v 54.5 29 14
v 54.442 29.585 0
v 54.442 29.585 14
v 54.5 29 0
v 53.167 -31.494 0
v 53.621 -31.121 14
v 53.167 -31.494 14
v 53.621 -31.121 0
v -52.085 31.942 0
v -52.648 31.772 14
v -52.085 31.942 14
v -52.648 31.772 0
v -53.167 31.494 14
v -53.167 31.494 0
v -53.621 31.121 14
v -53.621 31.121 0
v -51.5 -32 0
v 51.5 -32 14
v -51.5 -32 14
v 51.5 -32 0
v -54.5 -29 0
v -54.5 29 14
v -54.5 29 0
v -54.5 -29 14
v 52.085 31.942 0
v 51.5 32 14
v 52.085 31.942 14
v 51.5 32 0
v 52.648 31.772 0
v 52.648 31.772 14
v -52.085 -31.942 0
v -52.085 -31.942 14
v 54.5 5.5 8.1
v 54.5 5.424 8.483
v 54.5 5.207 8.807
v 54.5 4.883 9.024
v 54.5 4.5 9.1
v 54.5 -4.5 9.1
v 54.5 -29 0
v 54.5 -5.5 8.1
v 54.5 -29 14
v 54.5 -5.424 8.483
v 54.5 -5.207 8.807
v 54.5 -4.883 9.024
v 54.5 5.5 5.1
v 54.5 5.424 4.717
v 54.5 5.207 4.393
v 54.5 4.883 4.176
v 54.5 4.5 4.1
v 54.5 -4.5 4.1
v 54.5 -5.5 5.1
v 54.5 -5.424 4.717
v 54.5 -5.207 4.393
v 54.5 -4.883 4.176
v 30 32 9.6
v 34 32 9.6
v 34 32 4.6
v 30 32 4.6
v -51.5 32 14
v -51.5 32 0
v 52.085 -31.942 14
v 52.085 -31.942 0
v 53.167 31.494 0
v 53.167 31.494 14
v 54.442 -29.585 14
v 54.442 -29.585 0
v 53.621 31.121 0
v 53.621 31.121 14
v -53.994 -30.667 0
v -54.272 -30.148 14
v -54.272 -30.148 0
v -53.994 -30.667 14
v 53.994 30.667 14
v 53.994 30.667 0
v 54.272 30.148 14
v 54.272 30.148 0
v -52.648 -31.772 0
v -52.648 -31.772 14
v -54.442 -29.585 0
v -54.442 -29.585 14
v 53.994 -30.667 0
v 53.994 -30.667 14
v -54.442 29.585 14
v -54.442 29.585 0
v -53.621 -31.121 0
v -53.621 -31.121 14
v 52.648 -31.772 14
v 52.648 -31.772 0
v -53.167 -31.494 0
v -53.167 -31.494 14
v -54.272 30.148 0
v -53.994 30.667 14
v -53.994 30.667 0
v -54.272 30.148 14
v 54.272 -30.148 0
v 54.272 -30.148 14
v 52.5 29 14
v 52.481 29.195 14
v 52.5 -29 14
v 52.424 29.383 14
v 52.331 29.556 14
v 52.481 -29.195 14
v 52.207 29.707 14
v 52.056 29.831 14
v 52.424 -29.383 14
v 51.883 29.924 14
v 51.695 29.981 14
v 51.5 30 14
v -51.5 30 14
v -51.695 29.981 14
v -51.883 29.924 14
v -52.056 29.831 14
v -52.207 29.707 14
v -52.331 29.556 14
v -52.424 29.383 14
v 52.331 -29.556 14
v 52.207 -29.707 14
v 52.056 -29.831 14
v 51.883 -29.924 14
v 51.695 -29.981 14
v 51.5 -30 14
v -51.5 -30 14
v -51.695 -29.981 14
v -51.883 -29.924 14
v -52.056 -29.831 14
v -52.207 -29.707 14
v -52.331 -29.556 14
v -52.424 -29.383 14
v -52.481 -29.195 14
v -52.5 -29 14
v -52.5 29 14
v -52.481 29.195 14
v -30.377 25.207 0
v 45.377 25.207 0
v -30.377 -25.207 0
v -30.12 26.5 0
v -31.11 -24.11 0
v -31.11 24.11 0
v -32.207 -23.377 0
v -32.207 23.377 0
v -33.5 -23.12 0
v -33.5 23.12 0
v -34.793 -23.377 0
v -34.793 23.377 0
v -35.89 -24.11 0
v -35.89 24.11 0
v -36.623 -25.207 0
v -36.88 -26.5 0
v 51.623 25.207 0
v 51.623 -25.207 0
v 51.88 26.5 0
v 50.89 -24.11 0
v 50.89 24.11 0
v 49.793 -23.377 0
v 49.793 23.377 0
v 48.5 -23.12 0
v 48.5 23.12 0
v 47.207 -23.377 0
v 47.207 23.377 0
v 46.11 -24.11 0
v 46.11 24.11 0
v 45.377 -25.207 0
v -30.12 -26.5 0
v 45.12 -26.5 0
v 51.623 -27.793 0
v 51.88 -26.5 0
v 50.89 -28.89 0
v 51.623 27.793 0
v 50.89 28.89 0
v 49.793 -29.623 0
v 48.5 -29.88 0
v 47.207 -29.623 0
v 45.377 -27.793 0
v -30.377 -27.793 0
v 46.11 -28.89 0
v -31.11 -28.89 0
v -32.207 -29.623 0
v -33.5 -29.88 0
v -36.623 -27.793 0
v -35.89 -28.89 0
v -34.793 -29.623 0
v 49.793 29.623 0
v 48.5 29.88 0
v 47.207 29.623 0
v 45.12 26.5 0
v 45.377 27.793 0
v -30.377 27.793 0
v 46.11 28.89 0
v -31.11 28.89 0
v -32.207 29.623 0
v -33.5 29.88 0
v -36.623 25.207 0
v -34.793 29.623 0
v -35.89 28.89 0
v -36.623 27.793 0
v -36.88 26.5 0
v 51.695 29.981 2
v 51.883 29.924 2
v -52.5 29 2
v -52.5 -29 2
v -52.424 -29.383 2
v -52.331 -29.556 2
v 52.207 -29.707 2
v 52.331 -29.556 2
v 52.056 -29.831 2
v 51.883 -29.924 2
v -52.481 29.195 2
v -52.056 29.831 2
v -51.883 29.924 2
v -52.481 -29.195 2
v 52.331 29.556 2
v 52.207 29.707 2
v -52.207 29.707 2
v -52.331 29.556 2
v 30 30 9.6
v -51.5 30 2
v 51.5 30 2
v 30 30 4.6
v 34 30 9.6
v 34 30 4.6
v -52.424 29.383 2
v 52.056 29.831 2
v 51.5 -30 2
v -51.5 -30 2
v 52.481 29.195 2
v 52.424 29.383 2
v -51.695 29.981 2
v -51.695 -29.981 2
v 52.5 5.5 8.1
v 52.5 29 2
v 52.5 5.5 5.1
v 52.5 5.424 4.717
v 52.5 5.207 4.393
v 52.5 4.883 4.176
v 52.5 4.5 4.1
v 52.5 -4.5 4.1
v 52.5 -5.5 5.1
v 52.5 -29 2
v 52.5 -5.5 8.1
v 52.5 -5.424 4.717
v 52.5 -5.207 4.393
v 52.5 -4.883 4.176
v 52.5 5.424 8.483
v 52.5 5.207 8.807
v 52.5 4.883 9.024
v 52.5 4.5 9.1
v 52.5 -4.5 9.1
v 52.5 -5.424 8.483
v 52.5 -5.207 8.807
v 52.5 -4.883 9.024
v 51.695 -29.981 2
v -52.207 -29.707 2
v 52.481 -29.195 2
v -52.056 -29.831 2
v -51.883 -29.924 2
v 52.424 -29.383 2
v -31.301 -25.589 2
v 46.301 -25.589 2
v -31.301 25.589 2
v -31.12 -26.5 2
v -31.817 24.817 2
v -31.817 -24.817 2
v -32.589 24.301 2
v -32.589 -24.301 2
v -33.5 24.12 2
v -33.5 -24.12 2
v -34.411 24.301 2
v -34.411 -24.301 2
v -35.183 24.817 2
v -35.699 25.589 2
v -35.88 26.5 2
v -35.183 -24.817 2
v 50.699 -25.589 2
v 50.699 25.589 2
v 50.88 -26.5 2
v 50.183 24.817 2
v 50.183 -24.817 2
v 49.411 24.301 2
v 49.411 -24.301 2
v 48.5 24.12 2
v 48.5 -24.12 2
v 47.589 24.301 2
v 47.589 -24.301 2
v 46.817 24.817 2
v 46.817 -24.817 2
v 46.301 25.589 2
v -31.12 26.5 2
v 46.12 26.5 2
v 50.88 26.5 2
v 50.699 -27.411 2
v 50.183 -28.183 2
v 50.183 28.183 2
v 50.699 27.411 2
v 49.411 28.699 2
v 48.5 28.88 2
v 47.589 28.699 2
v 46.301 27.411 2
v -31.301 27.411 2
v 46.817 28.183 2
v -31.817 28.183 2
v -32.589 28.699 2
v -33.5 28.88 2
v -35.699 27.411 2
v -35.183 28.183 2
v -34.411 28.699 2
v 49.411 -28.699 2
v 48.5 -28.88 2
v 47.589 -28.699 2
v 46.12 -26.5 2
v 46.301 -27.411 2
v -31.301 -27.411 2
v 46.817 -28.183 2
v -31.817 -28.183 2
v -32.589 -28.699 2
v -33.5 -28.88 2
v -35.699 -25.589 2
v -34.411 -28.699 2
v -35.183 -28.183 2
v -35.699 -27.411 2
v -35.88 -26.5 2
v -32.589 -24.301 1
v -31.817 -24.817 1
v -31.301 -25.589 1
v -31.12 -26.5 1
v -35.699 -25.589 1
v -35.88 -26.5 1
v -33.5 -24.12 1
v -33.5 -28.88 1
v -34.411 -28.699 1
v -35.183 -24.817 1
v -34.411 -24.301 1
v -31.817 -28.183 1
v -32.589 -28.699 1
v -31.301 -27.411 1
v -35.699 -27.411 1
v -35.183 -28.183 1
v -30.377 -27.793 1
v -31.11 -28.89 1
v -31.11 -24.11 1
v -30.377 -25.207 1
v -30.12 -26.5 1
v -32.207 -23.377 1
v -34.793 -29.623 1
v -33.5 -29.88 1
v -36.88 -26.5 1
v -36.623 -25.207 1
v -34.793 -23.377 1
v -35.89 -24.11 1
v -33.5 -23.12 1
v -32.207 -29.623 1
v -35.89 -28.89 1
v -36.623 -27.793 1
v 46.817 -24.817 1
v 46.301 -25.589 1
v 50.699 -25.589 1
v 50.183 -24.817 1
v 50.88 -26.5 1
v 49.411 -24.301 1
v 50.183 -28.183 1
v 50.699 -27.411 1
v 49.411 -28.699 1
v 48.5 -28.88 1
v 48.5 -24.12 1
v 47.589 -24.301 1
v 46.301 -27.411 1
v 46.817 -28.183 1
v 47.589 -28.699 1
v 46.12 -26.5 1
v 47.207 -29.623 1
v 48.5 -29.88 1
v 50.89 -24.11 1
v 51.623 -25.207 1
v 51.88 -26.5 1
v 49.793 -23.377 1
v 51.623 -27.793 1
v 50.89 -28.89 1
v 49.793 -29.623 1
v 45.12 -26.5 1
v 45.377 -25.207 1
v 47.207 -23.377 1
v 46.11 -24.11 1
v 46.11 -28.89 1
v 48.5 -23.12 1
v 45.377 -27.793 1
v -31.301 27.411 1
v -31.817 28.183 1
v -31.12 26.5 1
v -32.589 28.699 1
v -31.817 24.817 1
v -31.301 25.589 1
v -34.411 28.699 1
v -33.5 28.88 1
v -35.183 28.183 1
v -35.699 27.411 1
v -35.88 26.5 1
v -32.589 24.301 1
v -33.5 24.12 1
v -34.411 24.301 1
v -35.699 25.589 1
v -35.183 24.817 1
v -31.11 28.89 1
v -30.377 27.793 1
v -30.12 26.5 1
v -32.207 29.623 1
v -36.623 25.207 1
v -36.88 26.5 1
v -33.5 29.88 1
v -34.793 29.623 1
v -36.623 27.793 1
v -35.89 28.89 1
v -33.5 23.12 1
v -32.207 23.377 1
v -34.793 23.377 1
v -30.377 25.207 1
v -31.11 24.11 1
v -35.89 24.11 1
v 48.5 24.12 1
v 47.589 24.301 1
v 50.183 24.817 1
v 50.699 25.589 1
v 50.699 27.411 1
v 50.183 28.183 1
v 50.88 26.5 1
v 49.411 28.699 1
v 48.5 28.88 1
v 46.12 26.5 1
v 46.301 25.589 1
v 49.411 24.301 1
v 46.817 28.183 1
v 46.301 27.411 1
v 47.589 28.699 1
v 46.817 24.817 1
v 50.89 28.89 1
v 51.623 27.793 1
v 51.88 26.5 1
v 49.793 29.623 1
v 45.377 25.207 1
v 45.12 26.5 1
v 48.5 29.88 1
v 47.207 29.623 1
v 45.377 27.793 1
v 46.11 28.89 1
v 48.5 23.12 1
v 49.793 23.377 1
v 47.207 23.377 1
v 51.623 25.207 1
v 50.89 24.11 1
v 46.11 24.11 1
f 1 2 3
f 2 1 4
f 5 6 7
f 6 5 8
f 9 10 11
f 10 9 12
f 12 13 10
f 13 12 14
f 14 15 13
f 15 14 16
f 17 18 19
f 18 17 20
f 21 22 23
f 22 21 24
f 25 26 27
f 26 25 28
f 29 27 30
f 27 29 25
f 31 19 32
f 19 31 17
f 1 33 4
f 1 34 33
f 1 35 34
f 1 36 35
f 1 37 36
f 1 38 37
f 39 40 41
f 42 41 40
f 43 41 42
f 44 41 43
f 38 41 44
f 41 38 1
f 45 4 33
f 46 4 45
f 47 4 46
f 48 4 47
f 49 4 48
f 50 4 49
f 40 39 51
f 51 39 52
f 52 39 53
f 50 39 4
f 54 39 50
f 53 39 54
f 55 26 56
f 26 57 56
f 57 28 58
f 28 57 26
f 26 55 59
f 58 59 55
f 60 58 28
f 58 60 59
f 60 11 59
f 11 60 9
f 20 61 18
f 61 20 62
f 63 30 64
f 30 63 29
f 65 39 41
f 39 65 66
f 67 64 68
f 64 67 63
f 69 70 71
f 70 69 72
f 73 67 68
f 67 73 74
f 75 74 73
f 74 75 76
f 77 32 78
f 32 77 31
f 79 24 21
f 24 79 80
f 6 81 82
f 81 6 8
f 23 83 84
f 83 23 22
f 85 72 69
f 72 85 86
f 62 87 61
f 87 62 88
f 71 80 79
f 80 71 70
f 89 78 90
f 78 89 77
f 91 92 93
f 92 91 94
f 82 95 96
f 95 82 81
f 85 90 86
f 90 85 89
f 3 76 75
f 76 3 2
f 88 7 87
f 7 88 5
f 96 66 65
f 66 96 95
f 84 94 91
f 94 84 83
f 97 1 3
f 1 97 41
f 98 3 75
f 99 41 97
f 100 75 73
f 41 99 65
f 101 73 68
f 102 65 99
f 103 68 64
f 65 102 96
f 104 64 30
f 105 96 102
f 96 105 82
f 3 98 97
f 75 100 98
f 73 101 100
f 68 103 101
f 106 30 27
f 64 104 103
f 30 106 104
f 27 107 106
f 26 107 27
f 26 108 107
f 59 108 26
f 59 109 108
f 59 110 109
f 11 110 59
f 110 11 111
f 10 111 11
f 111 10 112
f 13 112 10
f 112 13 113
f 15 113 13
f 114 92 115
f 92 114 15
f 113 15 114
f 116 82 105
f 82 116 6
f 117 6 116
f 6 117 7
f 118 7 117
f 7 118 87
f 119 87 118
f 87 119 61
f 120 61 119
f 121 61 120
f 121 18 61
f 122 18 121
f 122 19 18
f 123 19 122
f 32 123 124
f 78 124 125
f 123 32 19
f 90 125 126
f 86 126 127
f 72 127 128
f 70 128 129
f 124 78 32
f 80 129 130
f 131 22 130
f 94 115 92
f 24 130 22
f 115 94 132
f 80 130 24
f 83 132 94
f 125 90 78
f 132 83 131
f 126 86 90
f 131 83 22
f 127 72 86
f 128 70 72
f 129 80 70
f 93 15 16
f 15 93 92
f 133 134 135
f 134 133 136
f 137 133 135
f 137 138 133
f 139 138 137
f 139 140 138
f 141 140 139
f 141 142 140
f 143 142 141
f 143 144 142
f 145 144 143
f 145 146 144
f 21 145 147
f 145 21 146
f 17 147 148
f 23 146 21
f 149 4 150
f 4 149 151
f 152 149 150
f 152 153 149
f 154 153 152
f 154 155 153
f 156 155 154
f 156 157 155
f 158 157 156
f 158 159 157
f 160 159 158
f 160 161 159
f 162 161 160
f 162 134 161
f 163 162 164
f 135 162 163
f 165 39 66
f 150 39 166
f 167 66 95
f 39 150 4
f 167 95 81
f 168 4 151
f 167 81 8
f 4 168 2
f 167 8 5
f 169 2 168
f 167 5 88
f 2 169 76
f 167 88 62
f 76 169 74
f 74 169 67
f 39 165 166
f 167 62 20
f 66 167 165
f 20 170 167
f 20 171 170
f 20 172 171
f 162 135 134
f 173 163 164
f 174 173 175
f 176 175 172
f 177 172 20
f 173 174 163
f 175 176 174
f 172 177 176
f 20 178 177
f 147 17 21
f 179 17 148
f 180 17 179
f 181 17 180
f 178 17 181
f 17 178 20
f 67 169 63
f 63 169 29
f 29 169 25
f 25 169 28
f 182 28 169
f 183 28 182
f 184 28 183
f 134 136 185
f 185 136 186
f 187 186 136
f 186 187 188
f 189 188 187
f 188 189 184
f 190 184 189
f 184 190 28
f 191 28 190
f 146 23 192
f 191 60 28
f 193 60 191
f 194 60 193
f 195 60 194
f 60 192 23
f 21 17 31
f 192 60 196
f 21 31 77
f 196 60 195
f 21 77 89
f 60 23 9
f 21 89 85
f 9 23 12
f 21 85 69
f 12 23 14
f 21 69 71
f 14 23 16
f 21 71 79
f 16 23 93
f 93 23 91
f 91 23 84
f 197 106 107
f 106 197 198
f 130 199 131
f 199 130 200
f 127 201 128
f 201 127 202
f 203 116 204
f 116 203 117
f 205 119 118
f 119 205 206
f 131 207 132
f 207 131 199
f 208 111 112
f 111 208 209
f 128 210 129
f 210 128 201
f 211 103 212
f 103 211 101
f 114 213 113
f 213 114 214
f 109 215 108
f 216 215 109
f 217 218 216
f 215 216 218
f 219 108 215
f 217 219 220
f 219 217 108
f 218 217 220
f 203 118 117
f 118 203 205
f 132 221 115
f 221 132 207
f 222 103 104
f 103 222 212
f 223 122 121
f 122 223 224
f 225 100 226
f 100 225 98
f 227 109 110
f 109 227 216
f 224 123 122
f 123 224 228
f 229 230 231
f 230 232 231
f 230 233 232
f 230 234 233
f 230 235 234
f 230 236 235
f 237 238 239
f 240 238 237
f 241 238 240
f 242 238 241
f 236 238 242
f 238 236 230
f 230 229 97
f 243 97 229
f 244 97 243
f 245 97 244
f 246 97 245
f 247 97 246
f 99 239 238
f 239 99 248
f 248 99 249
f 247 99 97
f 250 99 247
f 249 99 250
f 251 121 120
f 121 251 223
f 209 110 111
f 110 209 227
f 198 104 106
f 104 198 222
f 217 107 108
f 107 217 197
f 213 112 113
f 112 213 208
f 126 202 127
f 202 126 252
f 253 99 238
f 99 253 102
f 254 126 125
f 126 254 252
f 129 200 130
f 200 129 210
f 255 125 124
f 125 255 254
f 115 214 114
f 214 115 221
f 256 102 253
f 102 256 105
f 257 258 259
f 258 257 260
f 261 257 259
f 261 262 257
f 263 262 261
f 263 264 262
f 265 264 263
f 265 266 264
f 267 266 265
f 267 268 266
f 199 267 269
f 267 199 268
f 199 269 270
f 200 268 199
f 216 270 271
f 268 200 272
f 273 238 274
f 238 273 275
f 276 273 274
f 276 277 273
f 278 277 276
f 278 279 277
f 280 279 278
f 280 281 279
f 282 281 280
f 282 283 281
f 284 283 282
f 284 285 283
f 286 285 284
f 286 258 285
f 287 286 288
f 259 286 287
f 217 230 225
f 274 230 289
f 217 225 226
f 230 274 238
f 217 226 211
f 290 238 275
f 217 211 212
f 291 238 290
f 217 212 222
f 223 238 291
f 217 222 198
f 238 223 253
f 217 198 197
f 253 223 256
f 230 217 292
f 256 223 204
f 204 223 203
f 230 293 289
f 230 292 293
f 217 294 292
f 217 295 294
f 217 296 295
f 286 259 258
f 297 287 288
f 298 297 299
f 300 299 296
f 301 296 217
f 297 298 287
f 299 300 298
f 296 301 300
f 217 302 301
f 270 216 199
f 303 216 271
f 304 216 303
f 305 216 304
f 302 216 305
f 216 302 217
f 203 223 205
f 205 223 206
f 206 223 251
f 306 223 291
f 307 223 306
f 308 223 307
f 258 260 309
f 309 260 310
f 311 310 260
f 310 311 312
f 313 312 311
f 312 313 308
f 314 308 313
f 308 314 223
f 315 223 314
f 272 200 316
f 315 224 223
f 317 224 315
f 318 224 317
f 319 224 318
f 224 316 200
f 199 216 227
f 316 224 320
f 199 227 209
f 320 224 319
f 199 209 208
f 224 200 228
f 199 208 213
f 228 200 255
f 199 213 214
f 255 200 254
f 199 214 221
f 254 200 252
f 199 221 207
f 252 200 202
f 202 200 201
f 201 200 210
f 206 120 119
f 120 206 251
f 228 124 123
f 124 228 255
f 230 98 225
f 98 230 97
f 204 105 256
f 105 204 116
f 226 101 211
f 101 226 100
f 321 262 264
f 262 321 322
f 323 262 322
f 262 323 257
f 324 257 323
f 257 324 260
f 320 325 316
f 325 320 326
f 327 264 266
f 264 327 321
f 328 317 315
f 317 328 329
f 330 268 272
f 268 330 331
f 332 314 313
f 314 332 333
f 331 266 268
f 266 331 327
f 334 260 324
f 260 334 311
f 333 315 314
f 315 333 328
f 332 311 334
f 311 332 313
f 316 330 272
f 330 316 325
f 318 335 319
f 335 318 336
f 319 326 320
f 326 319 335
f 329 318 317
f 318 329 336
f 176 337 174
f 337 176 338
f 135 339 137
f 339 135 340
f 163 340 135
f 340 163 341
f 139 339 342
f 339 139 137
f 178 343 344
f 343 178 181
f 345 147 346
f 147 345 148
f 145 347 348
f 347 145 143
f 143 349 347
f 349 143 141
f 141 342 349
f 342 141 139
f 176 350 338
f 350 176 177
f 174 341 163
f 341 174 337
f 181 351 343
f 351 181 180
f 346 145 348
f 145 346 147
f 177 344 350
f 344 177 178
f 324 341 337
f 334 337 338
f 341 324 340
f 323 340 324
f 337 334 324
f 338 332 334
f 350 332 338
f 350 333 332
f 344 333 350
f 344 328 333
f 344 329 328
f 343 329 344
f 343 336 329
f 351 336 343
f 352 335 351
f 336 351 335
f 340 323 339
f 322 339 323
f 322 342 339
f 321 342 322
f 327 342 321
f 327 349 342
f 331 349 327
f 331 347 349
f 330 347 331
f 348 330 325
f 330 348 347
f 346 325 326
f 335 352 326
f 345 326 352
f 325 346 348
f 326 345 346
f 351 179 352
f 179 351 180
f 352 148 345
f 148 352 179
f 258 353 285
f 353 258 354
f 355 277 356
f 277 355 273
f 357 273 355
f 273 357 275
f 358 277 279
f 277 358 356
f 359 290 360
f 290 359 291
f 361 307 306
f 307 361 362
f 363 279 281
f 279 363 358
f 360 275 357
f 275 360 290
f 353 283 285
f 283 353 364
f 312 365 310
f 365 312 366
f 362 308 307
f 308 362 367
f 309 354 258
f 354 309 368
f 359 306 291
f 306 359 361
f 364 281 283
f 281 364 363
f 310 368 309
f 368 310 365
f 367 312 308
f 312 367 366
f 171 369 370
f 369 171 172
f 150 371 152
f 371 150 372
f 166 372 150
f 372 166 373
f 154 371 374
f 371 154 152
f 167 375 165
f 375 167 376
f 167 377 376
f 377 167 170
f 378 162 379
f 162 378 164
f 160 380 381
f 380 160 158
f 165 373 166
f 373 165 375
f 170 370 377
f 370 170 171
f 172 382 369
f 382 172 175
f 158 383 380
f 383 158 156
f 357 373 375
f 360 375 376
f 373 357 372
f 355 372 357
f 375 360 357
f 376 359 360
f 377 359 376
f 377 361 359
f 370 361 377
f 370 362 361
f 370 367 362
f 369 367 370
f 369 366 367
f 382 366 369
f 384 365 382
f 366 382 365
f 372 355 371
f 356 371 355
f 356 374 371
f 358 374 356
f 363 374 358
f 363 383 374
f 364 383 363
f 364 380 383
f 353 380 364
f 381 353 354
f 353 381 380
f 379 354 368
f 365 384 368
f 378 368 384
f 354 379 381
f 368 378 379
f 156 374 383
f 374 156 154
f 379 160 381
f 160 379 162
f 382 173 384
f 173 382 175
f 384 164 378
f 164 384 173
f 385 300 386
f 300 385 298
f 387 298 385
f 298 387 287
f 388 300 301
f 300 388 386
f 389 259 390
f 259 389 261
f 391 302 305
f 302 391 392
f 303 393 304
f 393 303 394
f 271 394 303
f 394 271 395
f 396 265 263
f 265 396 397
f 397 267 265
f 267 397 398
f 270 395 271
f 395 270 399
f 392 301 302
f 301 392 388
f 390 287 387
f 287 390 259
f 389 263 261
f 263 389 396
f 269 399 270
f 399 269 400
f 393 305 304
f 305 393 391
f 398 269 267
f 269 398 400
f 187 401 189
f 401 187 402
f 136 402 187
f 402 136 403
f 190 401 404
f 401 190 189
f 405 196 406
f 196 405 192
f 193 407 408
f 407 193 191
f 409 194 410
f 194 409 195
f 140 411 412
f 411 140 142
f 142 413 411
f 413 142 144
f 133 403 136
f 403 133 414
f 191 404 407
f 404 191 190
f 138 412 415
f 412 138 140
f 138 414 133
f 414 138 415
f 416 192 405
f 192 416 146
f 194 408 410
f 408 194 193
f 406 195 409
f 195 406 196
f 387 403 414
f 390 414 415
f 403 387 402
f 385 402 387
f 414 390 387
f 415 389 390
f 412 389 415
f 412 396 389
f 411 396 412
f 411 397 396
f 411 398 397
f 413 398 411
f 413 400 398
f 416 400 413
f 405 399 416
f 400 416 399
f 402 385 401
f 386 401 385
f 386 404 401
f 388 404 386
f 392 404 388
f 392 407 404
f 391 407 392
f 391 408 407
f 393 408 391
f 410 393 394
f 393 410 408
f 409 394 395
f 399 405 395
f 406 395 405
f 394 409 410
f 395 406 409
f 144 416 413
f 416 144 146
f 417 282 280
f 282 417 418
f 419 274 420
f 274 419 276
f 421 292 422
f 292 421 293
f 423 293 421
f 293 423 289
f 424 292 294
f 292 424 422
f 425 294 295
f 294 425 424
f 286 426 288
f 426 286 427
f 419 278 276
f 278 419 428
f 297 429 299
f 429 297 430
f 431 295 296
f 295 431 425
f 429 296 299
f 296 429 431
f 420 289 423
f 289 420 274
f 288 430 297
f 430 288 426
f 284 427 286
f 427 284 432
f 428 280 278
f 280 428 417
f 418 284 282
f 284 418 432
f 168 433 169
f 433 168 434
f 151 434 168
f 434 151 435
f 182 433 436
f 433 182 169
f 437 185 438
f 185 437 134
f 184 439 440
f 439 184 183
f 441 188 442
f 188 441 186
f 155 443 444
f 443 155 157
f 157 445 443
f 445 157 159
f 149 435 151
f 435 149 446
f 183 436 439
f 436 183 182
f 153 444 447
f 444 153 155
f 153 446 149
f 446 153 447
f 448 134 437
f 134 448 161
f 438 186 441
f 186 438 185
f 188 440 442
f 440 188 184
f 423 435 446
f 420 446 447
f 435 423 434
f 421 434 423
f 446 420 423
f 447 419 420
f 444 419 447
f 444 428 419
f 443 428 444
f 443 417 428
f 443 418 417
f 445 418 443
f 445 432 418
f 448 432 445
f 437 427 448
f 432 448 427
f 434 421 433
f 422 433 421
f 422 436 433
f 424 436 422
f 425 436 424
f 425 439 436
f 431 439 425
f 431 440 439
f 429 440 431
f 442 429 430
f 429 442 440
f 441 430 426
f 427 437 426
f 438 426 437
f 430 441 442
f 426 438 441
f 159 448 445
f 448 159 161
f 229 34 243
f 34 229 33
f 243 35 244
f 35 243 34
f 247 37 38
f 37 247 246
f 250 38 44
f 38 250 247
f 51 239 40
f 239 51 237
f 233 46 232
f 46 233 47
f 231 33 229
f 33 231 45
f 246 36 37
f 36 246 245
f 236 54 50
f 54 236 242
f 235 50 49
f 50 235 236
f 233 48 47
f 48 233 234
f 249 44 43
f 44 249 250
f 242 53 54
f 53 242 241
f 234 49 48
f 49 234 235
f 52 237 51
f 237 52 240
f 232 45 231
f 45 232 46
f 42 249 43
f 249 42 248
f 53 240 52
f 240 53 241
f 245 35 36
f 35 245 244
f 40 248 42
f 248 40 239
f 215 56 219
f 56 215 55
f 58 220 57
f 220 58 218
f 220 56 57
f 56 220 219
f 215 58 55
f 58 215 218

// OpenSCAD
// MacroPad RP2040 Case (Bottom and Sides)
// Companion to macropad_top_cover.scad
// Parametric design for Adafruit MacroPad RP2040 keyboard controller
// Author: Generated for CircuitPython EVM Controller project
// License: MIT

// The bottom case along with the filler layer and cover OpenSCAD models provivided
// wraps the Adafruit MacroPad RP2040 in a tightfitting case. The case has a USB port
// the reset button opening, as well as 4 mounting holes to fasten the PCD to the case.

// =============================================================================
// PARAMETERS
// =============================================================================

// Adafruit Macropad RP2040 PCB parameters
pcb_length = 105;          // RP2040 PCB length (mm)
pcb_width = 60;            // RP2040 PCB width (mm)
pcb_thickness = 1.6;       // Standard PCB thickness (mm)
pcb_clearance = 1;         // Space around PCB (mm)
pcb_height_clearance = 8;  // Space above PCB for components (mm)

// Overall case dimensions (should match top cover)
bottom_thickness = 2;      // Thickness of bottom plate (mm)
wall_thickness = 2;        // Thickness of side walls (mm)
corner_radius = 3;         // Rounded corner radius (mm)
inner_corner_radius = 1;   // Rounded inner corner radius

case_length = pcb_length + (wall_thickness * 2);   // Total length of case (mm)
case_width = pcb_width +  + (wall_thickness * 2);  // Total width of case (mm)
case_height = 14;          // Height of case walls (mm)

// Top cover integration
top_cover_thickness = 3;   // Thickness of top cover (for fit calculation)
top_cover_lip = 1;         // How much top cover overlaps case walls (mm)

// USB port cutout
usb_width = 11;             // Width of USB-C port (mm)
usb_height = 5;            // ** Was 4 - Height of USB-C port (mm)
usb_offset_from_edge = 3;  // Distance from PCB edge to USB center (mm)
usb_position_y = 0;        // Y position along case width (0 = center)
usb_corner_radius = 1;     // Rounded corners for USB hole

// PCB mounting holes keep 2mm for wall in mind
mount_hole_diameter = 4.56;   // Diameter for M3 screws (mm)
mount_hole_positions = [   // [X, Y] positions relative to PCB center
    [-pcb_length/2 + 19, -26.5],   // Bottom left
    [pcb_length/2 - 4, -26.5],   // Bottom right  
    [-pcb_length/2 + 19, 26.5],    // Top left
    [pcb_length/2 - 4, 26.5]     // Top right
];

// Standoffs for PCB mounting
standoff_height = 6;         // Height of PCB standoffs (mm)
standoff_diameter = 5.2;     // Diameter of standoff base (mm)
standoff_hole_diameter = 2.5; // Hole diameter in standoff for screw (mm)

// 3D printing parameters
clearance = 0.2;           // General clearance (mm)
layer_height = 0.2;        // Your 3D printer layer height (mm)

// Catching indent for Cover support lip
cover_lip_indent = [10, 2.5, 2];


// =============================================================================
// MAIN OBJECT
// =============================================================================

difference() {
    union() {
        // Main case body
        case_body();

        // PCB mounting standoffs
        pcb_standoffs();
    }        

    // Remove internal cavity
    internal_cavity();

    // Remove USB port hole
    usb_port_hole();
    
    // Remove Reset port hole
    reset_port_hole();

    // Remove PCB mounting holes
    pcb_mounting_holes();
}

// Optional: Show PCB position for reference (comment out for final print)
// %pcb_reference();

// =============================================================================
// MODULES (Functions)
// =============================================================================

// Create the main case body with walls
module case_body() {
    // Bottom plate
    hull() {
        // Four corner cylinders for rounded rectangle base
        translate([-(case_length/2 - corner_radius), -(case_width/2 - corner_radius), 0])
            cylinder(h = bottom_thickness, r = corner_radius, $fn = 32);
        
        translate([+(case_length/2 - corner_radius), -(case_width/2 - corner_radius), 0])
            cylinder(h = bottom_thickness, r = corner_radius, $fn = 32);
        
        translate([+(case_length/2 - corner_radius), +(case_width/2 - corner_radius), 0])
            cylinder(h = bottom_thickness, r = corner_radius, $fn = 32);
        
        translate([-(case_length/2 - corner_radius), +(case_width/2 - corner_radius), 0])
            cylinder(h = bottom_thickness, r = corner_radius, $fn = 32);
    }
    
    // Side walls
    difference() {
        // Outer wall
        hull() {
            translate([-(case_length/2 - corner_radius), -(case_width/2 - corner_radius), 0])
                cylinder(h = case_height, r = corner_radius, $fn = 32);
            
            translate([+(case_length/2 - corner_radius), -(case_width/2 - corner_radius), 0])
                cylinder(h = case_height, r = corner_radius, $fn = 32);
            
            translate([+(case_length/2 - corner_radius), +(case_width/2 - corner_radius), 0])
                cylinder(h = case_height, r = corner_radius, $fn = 32);
            
            translate([-(case_length/2 - corner_radius), +(case_width/2 - corner_radius), 0])
                cylinder(h = case_height, r = corner_radius, $fn = 32);
        }
        
        // Inner cavity (removed in main difference)
        translate([0, 0, bottom_thickness])
            hull() {
                inner_radius = corner_radius - wall_thickness;
                inner_length = case_length - 2 * wall_thickness;
                inner_width = case_width - 2 * wall_thickness;
                
                translate([-(inner_length/2 - inner_radius), -(inner_width/2 - inner_radius), 0])
                    cylinder(h = case_height, r = inner_radius, $fn = 32);
                
                translate([+(inner_length/2 - inner_radius), -(inner_width/2 - inner_radius), 0])
                    cylinder(h = case_height, r = inner_radius, $fn = 32);
                
                translate([+(inner_length/2 - inner_radius), +(inner_width/2 - inner_radius), 0])
                    cylinder(h = case_height, r = inner_radius, $fn = 32);
                
                translate([-(inner_length/2 - inner_radius), +(inner_width/2 - inner_radius), 0])
                    cylinder(h = case_height, r = inner_radius, $fn = 32);
            }
    }
    
    // Top cover lip/ledge
    translate([0, 0, case_height - top_cover_thickness]) {
        difference() {
            // Outer ledge
            hull() {
                translate([-(case_length/2 - corner_radius), -(case_width/2 - corner_radius), 0])
                    cylinder(h = top_cover_thickness, r = corner_radius, $fn = 32);
                
                translate([+(case_length/2 - corner_radius), -(case_width/2 - corner_radius), 0])
                    cylinder(h = top_cover_thickness, r = corner_radius, $fn = 32);
                
                translate([+(case_length/2 - corner_radius), +(case_width/2 - corner_radius), 0])
                    cylinder(h = top_cover_thickness, r = corner_radius, $fn = 32);
                
                translate([-(case_length/2 - corner_radius), +(case_width/2 - corner_radius), 0])
                    cylinder(h = top_cover_thickness, r = corner_radius, $fn = 32);
            }
            
            // Inner cutout for top cover
            hull() {
                ledge_radius = corner_radius - top_cover_lip;
                ledge_length = case_length - 2 * top_cover_lip;
                ledge_width = case_width - 2 * top_cover_lip;
                
                translate([-(ledge_length/2 - ledge_radius), -(ledge_width/2 - ledge_radius), -0.5])
                    cylinder(h = top_cover_thickness + 1, r = ledge_radius, $fn = 32);
                
                translate([+(ledge_length/2 - ledge_radius), -(ledge_width/2 - ledge_radius), -0.5])
                    cylinder(h = top_cover_thickness + 1, r = ledge_radius, $fn = 32);
                
                translate([+(ledge_length/2 - ledge_radius), +(ledge_width/2 - ledge_radius), -0.5])
                    cylinder(h = top_cover_thickness + 1, r = ledge_radius, $fn = 32);
                
                translate([-(ledge_length/2 - ledge_radius), +(ledge_width/2 - ledge_radius), -0.5])
                    cylinder(h = top_cover_thickness + 1, r = ledge_radius, $fn = 32);
            }
        }
    }
}

// Create internal cavity (removed from main body)
module internal_cavity() {
    translate([0, 0, bottom_thickness]) {
        inner_radius = inner_corner_radius;
        inner_length = case_length - 2 * wall_thickness;
        inner_width = case_width - 2 * wall_thickness;
        
        hull() {
            translate([-(inner_length/2 - inner_radius), -(inner_width/2 - inner_radius), 0])
                cylinder(h = case_height, r = inner_radius, $fn = 32);
            
            translate([+(inner_length/2 - inner_radius), -(inner_width/2 - inner_radius), 0])
                cylinder(h = case_height, r = inner_radius, $fn = 32);
            
            translate([+(inner_length/2 - inner_radius), +(inner_width/2 - inner_radius), 0])
                cylinder(h = case_height, r = inner_radius, $fn = 32);
            
            translate([-(inner_length/2 - inner_radius), +(inner_width/2 - inner_radius), 0])
                cylinder(h = case_height, r = inner_radius, $fn = 32);
        }
    }
}

// Create PCB mounting standoffs
module pcb_standoffs() {
    for (pos = mount_hole_positions) {
        translate([pos[0], pos[1], bottom_thickness]) {
            cylinder(
                h = standoff_height, 
                d = standoff_diameter, 
                $fn = 16
            );
        }
    }
}

// Create USB port hole
module usb_port_hole() {
    // Position USB hole on the side wall
    translate([
        (case_length/2 - usb_offset_from_edge), 
        usb_position_y, 
        bottom_thickness + standoff_height + pcb_thickness + usb_height/2 - 5.5
    ]) {
        rotate([0, 90, 0]) {
            // Rounded rectangle for USB port
            hull() {
                translate([-(usb_height/2 - usb_corner_radius), -(usb_width/2 - usb_corner_radius), 0])
                    cylinder(h = wall_thickness + 2, r = usb_corner_radius, $fn = 16);
                
                translate([+(usb_height/2 - usb_corner_radius), -(usb_width/2 - usb_corner_radius), 0])
                    cylinder(h = wall_thickness + 2, r = usb_corner_radius, $fn = 16);
                
                translate([+(usb_height/2 - usb_corner_radius), +(usb_width/2 - usb_corner_radius), 0])
                    cylinder(h = wall_thickness + 2, r = usb_corner_radius, $fn = 16);
                
                translate([-(usb_height/2 - usb_corner_radius), +(usb_width/2 - usb_corner_radius), 0])
                    cylinder(h = wall_thickness + 2, r = usb_corner_radius, $fn = 16);
            }
        }
    }
}

// Create Reset port hole
module reset_port_hole() {
    // Position Reset hole on the side wall
    translate([
        -usb_position_y + (pcb_length/2 - 22.5), 
        (case_width/2 + usb_offset_from_edge - 1), 
        bottom_thickness + standoff_height + pcb_thickness + usb_height/2 - 5
    ]) {
        rotate([0, 90, 0]) {
            // Rounded rectangle for Reset port
            hull() {
                translate([-(usb_height/2 - usb_corner_radius), -(usb_width/2 - usb_corner_radius), 0])
                    cylinder(h = wall_thickness + 2, r = usb_corner_radius, $fn = 16);
                
                translate([+(usb_height/2 - usb_corner_radius), -(usb_width/2 - usb_corner_radius), 0])
                    cylinder(h = wall_thickness + 2, r = usb_corner_radius, $fn = 16);
                
                translate([+(usb_height/2 - usb_corner_radius), +(usb_width/2 - usb_corner_radius), 0])
                    cylinder(h = wall_thickness + 2, r = usb_corner_radius, $fn = 16);
                
                translate([-(usb_height/2 - usb_corner_radius), +(usb_width/2 - usb_corner_radius), 0])
                    cylinder(h = wall_thickness + 2, r = usb_corner_radius, $fn = 16);
            }
        }
    }
}

// Create PCB mounting holes
module pcb_mounting_holes() {
    for (pos = mount_hole_positions) {
        color("blue") translate([pos[0], pos[1], -0.5]) {
            // Through hole for screw
            cylinder(
                h = bottom_thickness + 1, 
                d = mount_hole_diameter + clearance, 
                $fn = 16
            );
        }
            
        // Countersink hole in standoff
        color("red") translate([pos[0], pos[1], -0.5]) {
            cylinder(
                h = bottom_thickness - 0.5, 
                d = mount_hole_diameter + clearance + 2, 
                $fn = 16
            );
        }
    }
}

// Create small PCB lip to lock cover plate in on the left and right
module cover_left_lip() {
    // Position Reset hole on the side wall
    color ("red") translate([
        usb_position_y, 
        (case_width/2 - 2), 
        bottom_thickness + standoff_height + pcb_thickness + usb_height/2 - 2
    ]) {
        cube(cover_lip_indent, center = true);
    }
}

// Create small PCB lip to lock top plate in on the left and right
module cover_right_lip() {
    // Position Reset hole on the side wall
    color ("red") translate([
        -usb_position_y, 
        -(case_width/2 - 2), 
        bottom_thickness + standoff_height + pcb_thickness + usb_height/2 - 2
    ]) {
        cube(cover_lip_indent, center = true);
    }
}


// Reference module to show PCB position (for design verification)
module pcb_reference() {
    translate([0, 0, bottom_thickness + standoff_height]) {
        // PCB outline
        color("green", 0.3) {
            hull() {
                pcb_corner_radius = 2;
                translate([-(pcb_length/2 - pcb_corner_radius), -(pcb_width/2 - pcb_corner_radius), 0])
                    cylinder(h = pcb_thickness, r = pcb_corner_radius, $fn = 16);
                
                translate([+(pcb_length/2 - pcb_corner_radius), -(pcb_width/2 - pcb_corner_radius), 0])
                    cylinder(h = pcb_thickness, r = pcb_corner_radius, $fn = 16);
                
                translate([+(pcb_length/2 - pcb_corner_radius), +(pcb_width/2 - pcb_corner_radius), 0])
                    cylinder(h = pcb_thickness, r = pcb_corner_radius, $fn = 16);
                
                translate([-(pcb_length/2 - pcb_corner_radius), +(pcb_width/2 - pcb_corner_radius), 0])
                    cylinder(h = pcb_thickness, r = pcb_corner_radius, $fn = 16);
            }
        }
        
        // Component clearance volume
        color("blue", 0.1) {
            translate([0, 0, pcb_thickness]) {
                hull() {
                    pcb_corner_radius = 2;
                    translate([-(pcb_length/2 - pcb_corner_radius), -(pcb_width/2 - pcb_corner_radius), 0])
                        cylinder(h = pcb_height_clearance, r = pcb_corner_radius, $fn = 16);
                    
                    translate([+(pcb_length/2 - pcb_corner_radius), -(pcb_width/2 - pcb_corner_radius), 0])
                        cylinder(h = pcb_height_clearance, r = pcb_corner_radius, $fn = 16);
                    
                    translate([+(pcb_length/2 - pcb_corner_radius), +(pcb_width/2 - pcb_corner_radius), 0])
                        cylinder(h = pcb_height_clearance, r = pcb_corner_radius, $fn = 16);
                    
                    translate([-(pcb_length/2 - pcb_corner_radius), +(pcb_width/2 - pcb_corner_radius), 0])
                        cylinder(h = pcb_height_clearance, r = pcb_corner_radius, $fn = 16);
                }
            }
        }
        
        // Mounting holes
        color("red") {
            for (pos = mount_hole_positions) {
                translate([pos[0], pos[1], 0]) {
                    cylinder(h = pcb_thickness, d = 3.2, $fn = 16);
                }
            }
        }
    }
}
